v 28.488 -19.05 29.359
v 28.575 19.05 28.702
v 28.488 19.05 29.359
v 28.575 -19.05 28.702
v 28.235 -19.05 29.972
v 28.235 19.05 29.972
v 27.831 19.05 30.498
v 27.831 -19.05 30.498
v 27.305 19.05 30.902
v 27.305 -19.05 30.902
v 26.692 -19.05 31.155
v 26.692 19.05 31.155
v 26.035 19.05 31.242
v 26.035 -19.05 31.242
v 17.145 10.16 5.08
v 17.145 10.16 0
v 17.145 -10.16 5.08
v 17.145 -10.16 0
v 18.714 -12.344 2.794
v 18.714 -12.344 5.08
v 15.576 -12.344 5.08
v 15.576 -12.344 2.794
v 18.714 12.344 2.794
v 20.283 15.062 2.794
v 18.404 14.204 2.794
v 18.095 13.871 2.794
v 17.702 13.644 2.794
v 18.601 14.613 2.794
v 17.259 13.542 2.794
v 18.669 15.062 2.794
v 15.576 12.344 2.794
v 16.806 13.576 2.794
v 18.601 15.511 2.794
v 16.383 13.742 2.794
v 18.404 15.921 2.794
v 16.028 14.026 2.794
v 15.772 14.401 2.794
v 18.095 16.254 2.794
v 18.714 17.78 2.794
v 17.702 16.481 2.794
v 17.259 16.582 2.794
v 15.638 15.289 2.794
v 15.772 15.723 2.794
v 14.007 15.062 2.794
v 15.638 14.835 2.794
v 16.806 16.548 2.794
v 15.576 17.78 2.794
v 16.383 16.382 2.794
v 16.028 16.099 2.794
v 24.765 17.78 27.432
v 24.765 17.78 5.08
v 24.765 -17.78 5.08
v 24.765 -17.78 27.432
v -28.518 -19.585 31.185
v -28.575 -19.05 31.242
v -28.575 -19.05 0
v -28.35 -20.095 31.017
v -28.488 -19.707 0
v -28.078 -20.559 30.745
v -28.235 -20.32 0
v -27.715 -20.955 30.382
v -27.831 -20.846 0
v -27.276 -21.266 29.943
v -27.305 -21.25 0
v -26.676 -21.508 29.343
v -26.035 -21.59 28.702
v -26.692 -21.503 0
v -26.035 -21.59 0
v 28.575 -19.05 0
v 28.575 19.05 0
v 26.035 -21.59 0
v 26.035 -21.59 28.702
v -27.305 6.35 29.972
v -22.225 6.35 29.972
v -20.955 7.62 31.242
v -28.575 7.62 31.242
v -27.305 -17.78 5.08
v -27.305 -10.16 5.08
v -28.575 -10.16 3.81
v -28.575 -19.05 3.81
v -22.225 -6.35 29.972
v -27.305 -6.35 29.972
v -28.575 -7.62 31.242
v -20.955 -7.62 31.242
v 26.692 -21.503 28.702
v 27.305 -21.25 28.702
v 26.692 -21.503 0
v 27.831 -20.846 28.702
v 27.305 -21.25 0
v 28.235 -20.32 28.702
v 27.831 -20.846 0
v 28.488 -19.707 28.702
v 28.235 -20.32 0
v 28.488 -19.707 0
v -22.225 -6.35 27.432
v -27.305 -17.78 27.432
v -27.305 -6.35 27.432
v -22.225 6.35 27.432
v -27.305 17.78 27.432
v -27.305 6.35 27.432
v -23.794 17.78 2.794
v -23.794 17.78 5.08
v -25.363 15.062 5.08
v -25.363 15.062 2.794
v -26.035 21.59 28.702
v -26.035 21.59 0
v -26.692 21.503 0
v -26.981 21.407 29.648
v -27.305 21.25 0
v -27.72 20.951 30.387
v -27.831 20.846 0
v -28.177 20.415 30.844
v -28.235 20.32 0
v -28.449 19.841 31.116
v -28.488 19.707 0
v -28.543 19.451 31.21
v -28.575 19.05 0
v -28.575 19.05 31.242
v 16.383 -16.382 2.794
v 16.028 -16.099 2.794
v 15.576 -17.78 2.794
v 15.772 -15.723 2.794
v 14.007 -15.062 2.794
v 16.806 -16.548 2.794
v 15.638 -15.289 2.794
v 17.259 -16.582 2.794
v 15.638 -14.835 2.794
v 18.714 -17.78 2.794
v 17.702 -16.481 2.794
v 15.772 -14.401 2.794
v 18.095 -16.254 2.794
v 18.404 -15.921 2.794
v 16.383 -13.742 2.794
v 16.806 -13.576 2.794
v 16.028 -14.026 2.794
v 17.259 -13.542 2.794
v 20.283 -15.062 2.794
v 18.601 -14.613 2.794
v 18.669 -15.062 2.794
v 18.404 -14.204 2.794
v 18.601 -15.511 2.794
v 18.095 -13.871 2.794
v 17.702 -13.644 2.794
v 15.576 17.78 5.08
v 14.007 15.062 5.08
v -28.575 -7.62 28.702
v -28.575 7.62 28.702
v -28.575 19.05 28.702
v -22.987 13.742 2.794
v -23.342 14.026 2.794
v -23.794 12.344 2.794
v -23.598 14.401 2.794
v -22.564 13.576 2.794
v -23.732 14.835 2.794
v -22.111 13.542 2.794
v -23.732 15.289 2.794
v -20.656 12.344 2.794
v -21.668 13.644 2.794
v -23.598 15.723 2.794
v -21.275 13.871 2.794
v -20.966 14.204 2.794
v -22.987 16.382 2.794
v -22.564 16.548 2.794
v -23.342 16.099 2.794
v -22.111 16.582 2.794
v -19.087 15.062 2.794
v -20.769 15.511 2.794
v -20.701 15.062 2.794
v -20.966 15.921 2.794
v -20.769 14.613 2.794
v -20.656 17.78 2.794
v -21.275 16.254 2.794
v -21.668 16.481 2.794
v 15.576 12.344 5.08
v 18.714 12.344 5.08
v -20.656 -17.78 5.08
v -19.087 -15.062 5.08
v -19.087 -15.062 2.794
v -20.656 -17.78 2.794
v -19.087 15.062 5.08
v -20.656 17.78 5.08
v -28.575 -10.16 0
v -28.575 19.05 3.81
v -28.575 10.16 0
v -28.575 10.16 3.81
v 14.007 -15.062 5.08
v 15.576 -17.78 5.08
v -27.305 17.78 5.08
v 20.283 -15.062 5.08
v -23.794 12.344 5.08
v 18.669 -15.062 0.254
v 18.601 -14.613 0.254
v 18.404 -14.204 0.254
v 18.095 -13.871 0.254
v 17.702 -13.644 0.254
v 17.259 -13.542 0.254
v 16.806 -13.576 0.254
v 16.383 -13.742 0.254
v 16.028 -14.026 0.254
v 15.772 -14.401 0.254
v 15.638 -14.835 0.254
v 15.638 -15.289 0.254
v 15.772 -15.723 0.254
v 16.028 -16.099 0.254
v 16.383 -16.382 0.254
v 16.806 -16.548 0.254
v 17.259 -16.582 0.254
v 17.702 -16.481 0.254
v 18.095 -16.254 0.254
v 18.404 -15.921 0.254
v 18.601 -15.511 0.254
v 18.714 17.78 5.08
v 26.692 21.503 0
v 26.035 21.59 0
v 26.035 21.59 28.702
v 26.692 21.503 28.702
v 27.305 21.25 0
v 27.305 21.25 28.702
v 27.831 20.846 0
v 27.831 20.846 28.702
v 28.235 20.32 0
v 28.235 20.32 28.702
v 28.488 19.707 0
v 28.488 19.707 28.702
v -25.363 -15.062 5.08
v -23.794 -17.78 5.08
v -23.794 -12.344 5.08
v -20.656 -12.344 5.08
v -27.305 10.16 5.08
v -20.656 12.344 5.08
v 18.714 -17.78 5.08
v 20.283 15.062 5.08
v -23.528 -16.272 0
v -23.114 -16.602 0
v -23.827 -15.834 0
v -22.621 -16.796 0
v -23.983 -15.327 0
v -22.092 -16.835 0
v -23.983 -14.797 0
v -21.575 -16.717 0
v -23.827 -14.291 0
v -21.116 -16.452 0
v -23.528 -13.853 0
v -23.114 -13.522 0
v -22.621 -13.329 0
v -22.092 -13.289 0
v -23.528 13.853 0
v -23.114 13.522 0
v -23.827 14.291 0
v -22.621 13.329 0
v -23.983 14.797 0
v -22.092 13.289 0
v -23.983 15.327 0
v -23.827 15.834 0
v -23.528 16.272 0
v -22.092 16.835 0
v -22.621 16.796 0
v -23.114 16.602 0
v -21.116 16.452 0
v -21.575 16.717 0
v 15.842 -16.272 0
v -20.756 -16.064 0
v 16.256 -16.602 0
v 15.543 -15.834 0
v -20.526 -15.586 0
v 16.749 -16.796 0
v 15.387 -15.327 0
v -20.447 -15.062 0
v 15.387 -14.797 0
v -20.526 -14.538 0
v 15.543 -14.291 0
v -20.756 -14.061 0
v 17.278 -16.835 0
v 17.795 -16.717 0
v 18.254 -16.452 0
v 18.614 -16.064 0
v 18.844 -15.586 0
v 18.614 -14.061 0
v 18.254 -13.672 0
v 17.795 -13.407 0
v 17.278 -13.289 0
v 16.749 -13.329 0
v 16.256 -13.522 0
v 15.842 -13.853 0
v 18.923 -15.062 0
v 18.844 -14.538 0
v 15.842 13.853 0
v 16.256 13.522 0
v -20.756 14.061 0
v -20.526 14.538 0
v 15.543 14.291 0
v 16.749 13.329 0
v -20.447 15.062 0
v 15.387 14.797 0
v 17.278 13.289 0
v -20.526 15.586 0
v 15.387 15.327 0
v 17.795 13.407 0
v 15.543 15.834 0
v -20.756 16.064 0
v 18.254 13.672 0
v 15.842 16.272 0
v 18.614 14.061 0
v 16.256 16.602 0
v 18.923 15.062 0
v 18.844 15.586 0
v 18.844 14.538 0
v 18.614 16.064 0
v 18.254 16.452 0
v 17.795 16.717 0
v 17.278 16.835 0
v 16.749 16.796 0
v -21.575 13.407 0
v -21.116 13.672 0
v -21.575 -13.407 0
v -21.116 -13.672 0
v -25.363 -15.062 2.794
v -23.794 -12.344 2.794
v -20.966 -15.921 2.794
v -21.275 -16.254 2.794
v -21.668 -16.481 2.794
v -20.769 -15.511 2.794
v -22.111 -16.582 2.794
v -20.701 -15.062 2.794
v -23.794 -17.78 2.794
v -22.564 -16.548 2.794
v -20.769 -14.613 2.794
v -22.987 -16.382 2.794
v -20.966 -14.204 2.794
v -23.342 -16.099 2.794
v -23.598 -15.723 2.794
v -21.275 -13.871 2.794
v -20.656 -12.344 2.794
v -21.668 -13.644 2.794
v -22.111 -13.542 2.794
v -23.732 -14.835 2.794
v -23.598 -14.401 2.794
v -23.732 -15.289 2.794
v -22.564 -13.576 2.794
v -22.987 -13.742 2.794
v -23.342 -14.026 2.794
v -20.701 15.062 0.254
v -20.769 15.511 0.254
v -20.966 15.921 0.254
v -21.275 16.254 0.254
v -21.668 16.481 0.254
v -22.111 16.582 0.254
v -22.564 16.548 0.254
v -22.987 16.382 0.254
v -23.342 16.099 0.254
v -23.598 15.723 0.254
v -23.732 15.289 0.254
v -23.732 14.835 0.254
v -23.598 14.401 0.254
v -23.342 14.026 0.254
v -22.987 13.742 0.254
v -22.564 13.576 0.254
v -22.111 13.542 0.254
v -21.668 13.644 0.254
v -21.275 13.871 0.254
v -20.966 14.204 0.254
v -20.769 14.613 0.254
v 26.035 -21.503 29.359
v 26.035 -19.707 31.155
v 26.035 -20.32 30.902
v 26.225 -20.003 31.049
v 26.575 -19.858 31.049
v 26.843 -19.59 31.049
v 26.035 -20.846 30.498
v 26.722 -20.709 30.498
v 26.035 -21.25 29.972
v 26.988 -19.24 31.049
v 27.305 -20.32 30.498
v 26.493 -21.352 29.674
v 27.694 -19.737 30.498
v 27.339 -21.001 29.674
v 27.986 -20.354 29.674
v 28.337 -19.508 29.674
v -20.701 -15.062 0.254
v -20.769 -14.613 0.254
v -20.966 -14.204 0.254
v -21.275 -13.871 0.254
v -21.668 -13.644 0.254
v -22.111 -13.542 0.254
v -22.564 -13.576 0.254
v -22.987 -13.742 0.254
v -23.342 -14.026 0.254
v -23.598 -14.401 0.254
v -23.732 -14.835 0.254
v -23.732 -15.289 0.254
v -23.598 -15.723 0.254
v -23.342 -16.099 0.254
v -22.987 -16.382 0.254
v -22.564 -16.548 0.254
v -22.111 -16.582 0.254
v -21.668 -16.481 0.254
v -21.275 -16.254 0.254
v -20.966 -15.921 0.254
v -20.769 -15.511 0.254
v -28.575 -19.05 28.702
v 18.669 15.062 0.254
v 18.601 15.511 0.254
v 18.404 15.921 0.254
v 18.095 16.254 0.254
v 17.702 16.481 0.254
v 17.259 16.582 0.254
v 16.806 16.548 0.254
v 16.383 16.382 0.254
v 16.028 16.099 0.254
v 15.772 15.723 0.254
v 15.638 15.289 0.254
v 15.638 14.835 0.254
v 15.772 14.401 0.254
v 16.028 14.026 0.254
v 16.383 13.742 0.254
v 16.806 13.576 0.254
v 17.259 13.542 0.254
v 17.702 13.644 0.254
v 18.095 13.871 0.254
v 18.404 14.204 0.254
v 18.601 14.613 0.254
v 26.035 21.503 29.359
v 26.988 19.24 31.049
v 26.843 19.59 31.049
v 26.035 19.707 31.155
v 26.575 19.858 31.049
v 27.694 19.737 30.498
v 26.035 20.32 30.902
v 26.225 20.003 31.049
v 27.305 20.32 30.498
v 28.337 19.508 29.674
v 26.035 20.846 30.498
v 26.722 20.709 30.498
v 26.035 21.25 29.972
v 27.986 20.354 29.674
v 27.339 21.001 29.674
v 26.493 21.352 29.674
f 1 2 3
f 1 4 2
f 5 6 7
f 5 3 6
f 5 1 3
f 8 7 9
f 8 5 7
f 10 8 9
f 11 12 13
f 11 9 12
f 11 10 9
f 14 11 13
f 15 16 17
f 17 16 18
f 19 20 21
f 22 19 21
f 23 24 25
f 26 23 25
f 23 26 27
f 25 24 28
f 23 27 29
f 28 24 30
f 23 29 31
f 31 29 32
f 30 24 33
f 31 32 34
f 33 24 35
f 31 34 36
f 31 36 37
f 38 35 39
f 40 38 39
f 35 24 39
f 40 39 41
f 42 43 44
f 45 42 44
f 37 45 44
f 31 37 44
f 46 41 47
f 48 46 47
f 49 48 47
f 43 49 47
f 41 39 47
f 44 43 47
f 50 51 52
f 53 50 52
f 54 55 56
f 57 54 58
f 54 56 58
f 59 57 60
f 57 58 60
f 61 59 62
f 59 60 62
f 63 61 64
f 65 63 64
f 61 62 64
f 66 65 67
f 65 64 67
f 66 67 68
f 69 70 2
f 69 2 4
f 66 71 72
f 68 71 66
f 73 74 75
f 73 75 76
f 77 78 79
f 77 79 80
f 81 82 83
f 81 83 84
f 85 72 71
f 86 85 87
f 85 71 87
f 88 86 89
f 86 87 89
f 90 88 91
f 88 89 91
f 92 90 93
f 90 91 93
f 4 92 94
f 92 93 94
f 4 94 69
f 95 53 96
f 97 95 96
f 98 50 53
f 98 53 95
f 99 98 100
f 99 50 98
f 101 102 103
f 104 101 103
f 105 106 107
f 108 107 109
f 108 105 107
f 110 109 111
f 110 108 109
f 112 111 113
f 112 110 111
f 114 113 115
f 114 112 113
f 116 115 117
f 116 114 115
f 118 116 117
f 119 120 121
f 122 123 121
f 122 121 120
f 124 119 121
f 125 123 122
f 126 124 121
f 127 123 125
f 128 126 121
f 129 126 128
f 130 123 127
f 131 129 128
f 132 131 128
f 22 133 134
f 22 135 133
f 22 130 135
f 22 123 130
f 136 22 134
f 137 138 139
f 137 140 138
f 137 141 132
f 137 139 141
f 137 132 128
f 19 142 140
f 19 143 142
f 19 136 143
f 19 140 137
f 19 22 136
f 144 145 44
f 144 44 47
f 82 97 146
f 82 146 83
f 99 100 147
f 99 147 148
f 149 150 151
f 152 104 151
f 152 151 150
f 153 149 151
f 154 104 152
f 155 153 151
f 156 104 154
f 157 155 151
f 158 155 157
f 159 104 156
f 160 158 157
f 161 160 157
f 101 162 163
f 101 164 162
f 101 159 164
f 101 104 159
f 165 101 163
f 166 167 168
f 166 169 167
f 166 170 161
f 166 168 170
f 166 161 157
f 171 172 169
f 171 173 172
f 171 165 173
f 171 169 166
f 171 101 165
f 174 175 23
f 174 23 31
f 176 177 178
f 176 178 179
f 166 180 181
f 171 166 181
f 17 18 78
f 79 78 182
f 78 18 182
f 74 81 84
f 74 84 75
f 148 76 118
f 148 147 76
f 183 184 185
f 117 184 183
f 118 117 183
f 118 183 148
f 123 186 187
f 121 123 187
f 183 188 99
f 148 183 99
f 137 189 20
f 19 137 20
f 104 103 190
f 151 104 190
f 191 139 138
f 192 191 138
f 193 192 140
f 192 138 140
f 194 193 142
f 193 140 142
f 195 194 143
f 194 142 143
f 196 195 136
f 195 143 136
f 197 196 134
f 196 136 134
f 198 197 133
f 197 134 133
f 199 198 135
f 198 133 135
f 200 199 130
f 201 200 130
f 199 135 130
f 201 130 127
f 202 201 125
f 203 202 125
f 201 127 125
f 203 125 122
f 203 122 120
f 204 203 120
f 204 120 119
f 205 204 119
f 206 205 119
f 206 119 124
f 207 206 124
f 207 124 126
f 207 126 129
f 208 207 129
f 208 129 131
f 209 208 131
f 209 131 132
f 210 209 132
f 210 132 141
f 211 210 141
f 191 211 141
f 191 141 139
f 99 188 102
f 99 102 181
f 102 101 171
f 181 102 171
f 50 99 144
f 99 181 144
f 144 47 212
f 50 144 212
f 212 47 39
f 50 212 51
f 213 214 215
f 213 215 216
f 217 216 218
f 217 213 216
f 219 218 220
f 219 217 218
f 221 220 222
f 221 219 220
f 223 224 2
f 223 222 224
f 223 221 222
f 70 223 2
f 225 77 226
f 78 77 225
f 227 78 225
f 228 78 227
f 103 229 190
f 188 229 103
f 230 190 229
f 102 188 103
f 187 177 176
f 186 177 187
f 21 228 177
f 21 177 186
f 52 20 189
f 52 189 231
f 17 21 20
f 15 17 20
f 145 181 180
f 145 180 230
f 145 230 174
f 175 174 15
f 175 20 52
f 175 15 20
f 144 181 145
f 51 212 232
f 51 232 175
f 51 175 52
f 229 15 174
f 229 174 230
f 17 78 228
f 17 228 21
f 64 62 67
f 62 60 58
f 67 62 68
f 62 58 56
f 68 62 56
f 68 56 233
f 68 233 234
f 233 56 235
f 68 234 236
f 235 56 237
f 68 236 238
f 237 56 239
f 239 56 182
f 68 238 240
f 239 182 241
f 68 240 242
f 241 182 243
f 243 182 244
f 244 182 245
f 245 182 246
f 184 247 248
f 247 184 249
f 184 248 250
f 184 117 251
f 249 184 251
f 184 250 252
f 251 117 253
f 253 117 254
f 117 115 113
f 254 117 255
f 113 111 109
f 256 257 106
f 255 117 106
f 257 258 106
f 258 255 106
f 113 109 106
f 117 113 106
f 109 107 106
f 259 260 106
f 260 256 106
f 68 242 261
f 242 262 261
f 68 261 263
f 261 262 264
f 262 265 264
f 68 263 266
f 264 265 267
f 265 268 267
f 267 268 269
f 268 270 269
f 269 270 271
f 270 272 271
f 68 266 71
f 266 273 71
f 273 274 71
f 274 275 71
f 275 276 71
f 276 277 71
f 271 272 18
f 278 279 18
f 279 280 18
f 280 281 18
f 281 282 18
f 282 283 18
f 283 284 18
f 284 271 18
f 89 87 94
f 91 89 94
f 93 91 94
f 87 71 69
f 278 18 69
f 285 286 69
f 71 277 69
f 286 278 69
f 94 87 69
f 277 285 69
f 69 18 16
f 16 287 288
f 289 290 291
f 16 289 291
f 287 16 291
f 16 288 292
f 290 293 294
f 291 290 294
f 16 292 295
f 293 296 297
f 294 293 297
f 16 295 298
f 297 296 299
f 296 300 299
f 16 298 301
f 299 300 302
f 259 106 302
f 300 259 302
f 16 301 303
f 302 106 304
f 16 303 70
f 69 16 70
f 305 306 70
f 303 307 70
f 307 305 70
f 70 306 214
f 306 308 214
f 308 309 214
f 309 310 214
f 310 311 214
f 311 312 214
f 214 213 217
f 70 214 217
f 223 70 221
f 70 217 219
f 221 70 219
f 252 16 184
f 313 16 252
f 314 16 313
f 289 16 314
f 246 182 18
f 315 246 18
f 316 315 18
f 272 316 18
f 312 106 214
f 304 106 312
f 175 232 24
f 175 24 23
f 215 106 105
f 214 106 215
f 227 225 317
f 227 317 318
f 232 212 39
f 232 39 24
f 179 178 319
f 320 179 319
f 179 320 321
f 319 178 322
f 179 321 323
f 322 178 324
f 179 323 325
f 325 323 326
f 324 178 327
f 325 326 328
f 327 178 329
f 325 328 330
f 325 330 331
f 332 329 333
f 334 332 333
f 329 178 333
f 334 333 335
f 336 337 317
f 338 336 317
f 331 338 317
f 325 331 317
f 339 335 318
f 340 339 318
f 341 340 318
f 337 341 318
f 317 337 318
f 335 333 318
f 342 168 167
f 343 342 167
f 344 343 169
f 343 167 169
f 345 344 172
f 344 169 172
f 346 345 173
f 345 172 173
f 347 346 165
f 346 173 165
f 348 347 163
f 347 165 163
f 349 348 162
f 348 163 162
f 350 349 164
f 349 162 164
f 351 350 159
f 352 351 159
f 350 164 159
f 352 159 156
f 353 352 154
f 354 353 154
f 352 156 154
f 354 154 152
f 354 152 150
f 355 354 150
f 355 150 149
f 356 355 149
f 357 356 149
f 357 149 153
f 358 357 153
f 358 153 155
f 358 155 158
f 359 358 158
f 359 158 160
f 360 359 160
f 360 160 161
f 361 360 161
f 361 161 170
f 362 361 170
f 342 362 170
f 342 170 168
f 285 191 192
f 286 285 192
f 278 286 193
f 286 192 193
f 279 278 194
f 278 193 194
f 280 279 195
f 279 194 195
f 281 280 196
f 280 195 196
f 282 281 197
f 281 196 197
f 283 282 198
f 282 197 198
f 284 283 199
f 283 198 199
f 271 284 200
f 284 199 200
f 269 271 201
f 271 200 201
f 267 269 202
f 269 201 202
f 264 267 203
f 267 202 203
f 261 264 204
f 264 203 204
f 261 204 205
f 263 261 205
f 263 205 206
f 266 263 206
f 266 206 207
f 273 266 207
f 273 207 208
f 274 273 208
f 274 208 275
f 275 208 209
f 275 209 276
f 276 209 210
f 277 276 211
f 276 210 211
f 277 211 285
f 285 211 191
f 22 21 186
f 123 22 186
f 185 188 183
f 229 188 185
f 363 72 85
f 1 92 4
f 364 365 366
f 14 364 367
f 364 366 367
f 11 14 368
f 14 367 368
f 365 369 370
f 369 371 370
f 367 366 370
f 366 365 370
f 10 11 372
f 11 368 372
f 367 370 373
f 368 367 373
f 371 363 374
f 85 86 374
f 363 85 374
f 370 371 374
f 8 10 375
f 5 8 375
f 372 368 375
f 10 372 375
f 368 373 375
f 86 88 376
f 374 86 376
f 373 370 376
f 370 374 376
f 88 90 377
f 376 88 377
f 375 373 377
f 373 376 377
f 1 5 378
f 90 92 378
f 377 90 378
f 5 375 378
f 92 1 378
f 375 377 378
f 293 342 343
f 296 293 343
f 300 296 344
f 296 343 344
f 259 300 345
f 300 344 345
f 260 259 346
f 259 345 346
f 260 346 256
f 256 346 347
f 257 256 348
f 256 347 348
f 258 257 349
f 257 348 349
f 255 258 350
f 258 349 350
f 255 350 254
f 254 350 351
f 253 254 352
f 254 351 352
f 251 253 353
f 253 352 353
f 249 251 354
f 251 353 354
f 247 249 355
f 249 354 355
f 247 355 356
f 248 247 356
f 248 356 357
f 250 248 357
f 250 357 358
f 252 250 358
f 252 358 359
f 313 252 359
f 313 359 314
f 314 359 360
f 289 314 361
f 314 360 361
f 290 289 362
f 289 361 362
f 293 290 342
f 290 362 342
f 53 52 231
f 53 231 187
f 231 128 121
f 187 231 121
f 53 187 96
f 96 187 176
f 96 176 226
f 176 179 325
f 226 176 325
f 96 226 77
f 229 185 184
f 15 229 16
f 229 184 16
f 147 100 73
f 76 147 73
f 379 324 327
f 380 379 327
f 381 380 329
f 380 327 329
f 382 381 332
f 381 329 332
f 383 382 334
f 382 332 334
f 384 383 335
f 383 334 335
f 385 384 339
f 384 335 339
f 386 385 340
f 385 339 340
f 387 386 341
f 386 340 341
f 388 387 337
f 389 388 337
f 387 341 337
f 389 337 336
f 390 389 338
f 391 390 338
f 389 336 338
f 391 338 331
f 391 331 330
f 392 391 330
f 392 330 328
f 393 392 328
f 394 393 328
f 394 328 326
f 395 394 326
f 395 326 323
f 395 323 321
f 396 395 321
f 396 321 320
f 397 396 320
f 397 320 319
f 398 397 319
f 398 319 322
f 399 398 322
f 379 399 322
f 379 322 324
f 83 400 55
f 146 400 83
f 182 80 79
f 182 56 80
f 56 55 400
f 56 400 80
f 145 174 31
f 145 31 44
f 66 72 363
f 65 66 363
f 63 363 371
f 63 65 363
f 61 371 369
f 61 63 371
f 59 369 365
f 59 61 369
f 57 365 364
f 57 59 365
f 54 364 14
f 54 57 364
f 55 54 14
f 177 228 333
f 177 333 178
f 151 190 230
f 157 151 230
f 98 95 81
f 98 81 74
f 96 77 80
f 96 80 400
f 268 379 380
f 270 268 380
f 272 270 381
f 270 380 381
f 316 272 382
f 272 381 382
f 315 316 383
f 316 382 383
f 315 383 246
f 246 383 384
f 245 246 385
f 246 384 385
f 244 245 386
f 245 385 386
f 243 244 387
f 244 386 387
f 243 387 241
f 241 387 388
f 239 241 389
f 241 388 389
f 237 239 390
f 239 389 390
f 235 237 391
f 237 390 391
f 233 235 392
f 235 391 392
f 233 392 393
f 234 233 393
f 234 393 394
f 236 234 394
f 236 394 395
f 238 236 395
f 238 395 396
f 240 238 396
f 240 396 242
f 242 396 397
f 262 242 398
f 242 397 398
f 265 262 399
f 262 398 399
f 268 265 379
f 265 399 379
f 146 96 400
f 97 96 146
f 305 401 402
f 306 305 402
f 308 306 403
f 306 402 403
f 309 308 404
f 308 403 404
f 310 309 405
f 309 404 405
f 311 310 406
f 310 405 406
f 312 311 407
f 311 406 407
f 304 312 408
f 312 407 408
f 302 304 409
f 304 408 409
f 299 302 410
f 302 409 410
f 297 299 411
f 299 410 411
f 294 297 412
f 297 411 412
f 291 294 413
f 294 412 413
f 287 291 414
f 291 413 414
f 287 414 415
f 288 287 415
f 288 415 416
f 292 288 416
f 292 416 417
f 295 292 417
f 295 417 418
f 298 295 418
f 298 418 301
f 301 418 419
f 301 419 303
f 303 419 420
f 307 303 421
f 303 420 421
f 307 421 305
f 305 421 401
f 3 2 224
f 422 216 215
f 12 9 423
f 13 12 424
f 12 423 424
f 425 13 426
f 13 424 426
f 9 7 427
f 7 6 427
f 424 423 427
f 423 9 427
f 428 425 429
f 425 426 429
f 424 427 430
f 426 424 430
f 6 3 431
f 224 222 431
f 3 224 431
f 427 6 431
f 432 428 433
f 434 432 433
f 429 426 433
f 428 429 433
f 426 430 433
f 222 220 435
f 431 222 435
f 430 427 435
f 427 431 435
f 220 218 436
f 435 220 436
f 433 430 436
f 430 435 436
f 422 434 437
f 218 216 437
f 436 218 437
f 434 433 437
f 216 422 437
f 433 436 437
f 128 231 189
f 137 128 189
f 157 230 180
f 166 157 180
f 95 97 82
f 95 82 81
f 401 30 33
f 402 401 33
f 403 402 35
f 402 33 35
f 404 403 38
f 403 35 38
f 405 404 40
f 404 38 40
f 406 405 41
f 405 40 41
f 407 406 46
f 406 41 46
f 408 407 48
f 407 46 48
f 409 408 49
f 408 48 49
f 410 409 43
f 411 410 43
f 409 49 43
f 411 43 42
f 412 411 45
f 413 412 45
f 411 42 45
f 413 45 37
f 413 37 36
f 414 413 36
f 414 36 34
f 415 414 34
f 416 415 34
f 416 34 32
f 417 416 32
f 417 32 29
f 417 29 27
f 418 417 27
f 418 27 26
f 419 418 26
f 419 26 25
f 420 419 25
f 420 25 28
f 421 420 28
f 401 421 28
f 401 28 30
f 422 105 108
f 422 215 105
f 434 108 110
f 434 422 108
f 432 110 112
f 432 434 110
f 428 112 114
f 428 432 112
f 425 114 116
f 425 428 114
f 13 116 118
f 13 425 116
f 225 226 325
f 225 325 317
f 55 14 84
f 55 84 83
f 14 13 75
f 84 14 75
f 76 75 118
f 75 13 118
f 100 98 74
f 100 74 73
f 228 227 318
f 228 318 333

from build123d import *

# Parameters (mm, degrees)
BOSS_EXTRUDE1_DEPTH = 27.432
BOSS_EXTRUDE2_DEPTH = 5.08
SKETCH4_R           = 1.524
CUT_EXTRUDE1_DEPTH  = 2.286
SKETCH4_4_R         = 1.524
CUT_EXTRUDE2_DEPTH  = 43.216947178
BOSS_EXTRUDE3_DEPTH = 3.81
FILLET1_R           = 2.54
CHAMFER3_SIZE       = 1.27
CHAMFER4_SIZE       = 0.254


with BuildPart() as part:
    # Sketch1 → Boss-Extrude1 (new body)
    with BuildSketch(Plane.XY):
        Polygon((-28.575, 21.59), (-28.575, 17.78), (24.765, 17.78), (24.765, -17.78), (-28.575, -17.78), (-28.575, -21.59), (28.575, -21.59), (28.575, 21.59), align=None)
    extrude(amount=BOSS_EXTRUDE1_DEPTH)

    # Sketch1<3> → Boss-Extrude2 (add)
    with BuildSketch(Plane.XY):
        Polygon((24.765, 17.78), (-28.575, 17.78), (-28.575, 10.16), (17.145, 10.16), (17.145, -10.16), (-28.575, -10.16), (-28.575, -17.78), (24.765, -17.78), align=None)
    extrude(amount=BOSS_EXTRUDE2_DEPTH)

    # Sketch4 → Cut-Extrude1 (cut)
    # profile 1 of 4: a face of its own
    with BuildSketch(Plane.XY.offset(5.08)):
        Polygon((-20.655877438, 17.78), (-23.794122562, 17.78), (-25.363245123, 15.0622), (-23.794122562, 12.3444), (-20.655877438, 12.3444), (-19.086754877, 15.0622), align=None)
        with Locations((-22.225, 15.0622)):
            Circle(SKETCH4_R, mode=Mode.SUBTRACT)
    # profile 2 of 4: a face of its own
    with BuildSketch(Plane.XY.offset(5.08)):
        Polygon((18.714122562, 12.3444), (15.575877438, 12.3444), (14.006754877, 15.0622), (15.575877438, 17.78), (18.714122562, 17.78), (20.283245123, 15.0622), align=None)
        with Locations((17.145, 15.0622)):
            Circle(SKETCH4_R, mode=Mode.SUBTRACT)
    # profile 3 of 4: a face of its own
    with BuildSketch(Plane.XY.offset(5.08)):
        Polygon((20.283245123, -15.0622), (18.714122562, -12.3444), (15.575877438, -12.3444), (14.006754877, -15.0622), (15.575877438, -17.78), (18.714122562, -17.78), align=None)
        with Locations((17.145, -15.0622)):
            Circle(SKETCH4_R, mode=Mode.SUBTRACT)
    # profile 4 of 4: a face of its own
    with BuildSketch(Plane.XY.offset(5.08)):
        Polygon((-25.363245123, -15.0622), (-23.794122562, -12.3444), (-20.655877438, -12.3444), (-19.086754877, -15.0622), (-20.655877438, -17.78), (-23.794122562, -17.78), align=None)
        with Locations((-22.225, -15.0622)):
            Circle(SKETCH4_R, mode=Mode.SUBTRACT)
    extrude(amount=-CUT_EXTRUDE1_DEPTH, mode=Mode.SUBTRACT)

    # Sketch4<4> → Cut-Extrude2 (cut, through all)
    with BuildSketch(Plane.XY.offset(5.08)):
        with Locations((-22.225, 15.0622)):
            Circle(SKETCH4_4_R)
        with Locations((17.145, 15.0622)):
            Circle(SKETCH4_4_R)
        with Locations((-22.225, -15.0622)):
            Circle(SKETCH4_4_R)
        with Locations((17.145, -15.0622)):
            Circle(SKETCH4_4_R)
    extrude(amount=-CUT_EXTRUDE2_DEPTH, mode=Mode.SUBTRACT)

    # Sketch7 → Boss-Extrude3 (add)
    with BuildSketch(Plane.XY.offset(27.432)):
        Polygon((-28.575, 21.59), (28.575, 21.59), (28.575, -21.59), (-28.575, -21.59), (-28.575, -6.35), (-22.225, -6.35), (-22.225, 6.35), (-28.575, 6.35), align=None)
    extrude(amount=BOSS_EXTRUDE3_DEPTH)

    # Fillet1
    fillet1_edges = [part.edges().sort_by_distance(p)[0] for p in [
        (-28.575, 21.59, 15.621),
        (28.575, 21.59, 15.621),
        (28.575, -21.59, 15.621),
        (-28.575, -21.59, 15.621),
        (0, -21.59, 31.242),
        (28.575, 0, 31.242),
        (0, 21.59, 31.242),
    ]]
    fillet(fillet1_edges, radius=FILLET1_R)

    # Chamfer3
    chamfer3_edges = [part.edges().sort_by_distance(p)[0] for p in [
        (-28.575, 12.065, 27.432),
        (-28.575, 17.78, 16.256),
        (-28.575, 6.35, 29.337),
        (-28.575, -12.065, 27.432),
        (-28.575, -6.35, 29.337),
        (-25.4, 6.35, 31.242),
        (-22.225, 0, 31.242),
        (-25.4, -6.35, 31.242),
        (-28.575, -17.78, 16.256),
        (-28.575, -13.97, 5.08),
        (-28.575, 13.97, 5.08),
    ]]
    chamfer(chamfer3_edges, length=CHAMFER3_SIZE - 0.0001)  # a hair under: the kernel refuses the full size

    # Chamfer4
    chamfer4_edges = [part.edges().sort_by_distance(p)[0] for p in [
        (15.621, 15.0622, 0),
        (-23.749, -15.0622, 0),
        (15.621, -15.0622, 0),
        (-23.749, 15.0622, 0),
    ]]
    chamfer(chamfer4_edges, length=CHAMFER4_SIZE)


solid = part.part
